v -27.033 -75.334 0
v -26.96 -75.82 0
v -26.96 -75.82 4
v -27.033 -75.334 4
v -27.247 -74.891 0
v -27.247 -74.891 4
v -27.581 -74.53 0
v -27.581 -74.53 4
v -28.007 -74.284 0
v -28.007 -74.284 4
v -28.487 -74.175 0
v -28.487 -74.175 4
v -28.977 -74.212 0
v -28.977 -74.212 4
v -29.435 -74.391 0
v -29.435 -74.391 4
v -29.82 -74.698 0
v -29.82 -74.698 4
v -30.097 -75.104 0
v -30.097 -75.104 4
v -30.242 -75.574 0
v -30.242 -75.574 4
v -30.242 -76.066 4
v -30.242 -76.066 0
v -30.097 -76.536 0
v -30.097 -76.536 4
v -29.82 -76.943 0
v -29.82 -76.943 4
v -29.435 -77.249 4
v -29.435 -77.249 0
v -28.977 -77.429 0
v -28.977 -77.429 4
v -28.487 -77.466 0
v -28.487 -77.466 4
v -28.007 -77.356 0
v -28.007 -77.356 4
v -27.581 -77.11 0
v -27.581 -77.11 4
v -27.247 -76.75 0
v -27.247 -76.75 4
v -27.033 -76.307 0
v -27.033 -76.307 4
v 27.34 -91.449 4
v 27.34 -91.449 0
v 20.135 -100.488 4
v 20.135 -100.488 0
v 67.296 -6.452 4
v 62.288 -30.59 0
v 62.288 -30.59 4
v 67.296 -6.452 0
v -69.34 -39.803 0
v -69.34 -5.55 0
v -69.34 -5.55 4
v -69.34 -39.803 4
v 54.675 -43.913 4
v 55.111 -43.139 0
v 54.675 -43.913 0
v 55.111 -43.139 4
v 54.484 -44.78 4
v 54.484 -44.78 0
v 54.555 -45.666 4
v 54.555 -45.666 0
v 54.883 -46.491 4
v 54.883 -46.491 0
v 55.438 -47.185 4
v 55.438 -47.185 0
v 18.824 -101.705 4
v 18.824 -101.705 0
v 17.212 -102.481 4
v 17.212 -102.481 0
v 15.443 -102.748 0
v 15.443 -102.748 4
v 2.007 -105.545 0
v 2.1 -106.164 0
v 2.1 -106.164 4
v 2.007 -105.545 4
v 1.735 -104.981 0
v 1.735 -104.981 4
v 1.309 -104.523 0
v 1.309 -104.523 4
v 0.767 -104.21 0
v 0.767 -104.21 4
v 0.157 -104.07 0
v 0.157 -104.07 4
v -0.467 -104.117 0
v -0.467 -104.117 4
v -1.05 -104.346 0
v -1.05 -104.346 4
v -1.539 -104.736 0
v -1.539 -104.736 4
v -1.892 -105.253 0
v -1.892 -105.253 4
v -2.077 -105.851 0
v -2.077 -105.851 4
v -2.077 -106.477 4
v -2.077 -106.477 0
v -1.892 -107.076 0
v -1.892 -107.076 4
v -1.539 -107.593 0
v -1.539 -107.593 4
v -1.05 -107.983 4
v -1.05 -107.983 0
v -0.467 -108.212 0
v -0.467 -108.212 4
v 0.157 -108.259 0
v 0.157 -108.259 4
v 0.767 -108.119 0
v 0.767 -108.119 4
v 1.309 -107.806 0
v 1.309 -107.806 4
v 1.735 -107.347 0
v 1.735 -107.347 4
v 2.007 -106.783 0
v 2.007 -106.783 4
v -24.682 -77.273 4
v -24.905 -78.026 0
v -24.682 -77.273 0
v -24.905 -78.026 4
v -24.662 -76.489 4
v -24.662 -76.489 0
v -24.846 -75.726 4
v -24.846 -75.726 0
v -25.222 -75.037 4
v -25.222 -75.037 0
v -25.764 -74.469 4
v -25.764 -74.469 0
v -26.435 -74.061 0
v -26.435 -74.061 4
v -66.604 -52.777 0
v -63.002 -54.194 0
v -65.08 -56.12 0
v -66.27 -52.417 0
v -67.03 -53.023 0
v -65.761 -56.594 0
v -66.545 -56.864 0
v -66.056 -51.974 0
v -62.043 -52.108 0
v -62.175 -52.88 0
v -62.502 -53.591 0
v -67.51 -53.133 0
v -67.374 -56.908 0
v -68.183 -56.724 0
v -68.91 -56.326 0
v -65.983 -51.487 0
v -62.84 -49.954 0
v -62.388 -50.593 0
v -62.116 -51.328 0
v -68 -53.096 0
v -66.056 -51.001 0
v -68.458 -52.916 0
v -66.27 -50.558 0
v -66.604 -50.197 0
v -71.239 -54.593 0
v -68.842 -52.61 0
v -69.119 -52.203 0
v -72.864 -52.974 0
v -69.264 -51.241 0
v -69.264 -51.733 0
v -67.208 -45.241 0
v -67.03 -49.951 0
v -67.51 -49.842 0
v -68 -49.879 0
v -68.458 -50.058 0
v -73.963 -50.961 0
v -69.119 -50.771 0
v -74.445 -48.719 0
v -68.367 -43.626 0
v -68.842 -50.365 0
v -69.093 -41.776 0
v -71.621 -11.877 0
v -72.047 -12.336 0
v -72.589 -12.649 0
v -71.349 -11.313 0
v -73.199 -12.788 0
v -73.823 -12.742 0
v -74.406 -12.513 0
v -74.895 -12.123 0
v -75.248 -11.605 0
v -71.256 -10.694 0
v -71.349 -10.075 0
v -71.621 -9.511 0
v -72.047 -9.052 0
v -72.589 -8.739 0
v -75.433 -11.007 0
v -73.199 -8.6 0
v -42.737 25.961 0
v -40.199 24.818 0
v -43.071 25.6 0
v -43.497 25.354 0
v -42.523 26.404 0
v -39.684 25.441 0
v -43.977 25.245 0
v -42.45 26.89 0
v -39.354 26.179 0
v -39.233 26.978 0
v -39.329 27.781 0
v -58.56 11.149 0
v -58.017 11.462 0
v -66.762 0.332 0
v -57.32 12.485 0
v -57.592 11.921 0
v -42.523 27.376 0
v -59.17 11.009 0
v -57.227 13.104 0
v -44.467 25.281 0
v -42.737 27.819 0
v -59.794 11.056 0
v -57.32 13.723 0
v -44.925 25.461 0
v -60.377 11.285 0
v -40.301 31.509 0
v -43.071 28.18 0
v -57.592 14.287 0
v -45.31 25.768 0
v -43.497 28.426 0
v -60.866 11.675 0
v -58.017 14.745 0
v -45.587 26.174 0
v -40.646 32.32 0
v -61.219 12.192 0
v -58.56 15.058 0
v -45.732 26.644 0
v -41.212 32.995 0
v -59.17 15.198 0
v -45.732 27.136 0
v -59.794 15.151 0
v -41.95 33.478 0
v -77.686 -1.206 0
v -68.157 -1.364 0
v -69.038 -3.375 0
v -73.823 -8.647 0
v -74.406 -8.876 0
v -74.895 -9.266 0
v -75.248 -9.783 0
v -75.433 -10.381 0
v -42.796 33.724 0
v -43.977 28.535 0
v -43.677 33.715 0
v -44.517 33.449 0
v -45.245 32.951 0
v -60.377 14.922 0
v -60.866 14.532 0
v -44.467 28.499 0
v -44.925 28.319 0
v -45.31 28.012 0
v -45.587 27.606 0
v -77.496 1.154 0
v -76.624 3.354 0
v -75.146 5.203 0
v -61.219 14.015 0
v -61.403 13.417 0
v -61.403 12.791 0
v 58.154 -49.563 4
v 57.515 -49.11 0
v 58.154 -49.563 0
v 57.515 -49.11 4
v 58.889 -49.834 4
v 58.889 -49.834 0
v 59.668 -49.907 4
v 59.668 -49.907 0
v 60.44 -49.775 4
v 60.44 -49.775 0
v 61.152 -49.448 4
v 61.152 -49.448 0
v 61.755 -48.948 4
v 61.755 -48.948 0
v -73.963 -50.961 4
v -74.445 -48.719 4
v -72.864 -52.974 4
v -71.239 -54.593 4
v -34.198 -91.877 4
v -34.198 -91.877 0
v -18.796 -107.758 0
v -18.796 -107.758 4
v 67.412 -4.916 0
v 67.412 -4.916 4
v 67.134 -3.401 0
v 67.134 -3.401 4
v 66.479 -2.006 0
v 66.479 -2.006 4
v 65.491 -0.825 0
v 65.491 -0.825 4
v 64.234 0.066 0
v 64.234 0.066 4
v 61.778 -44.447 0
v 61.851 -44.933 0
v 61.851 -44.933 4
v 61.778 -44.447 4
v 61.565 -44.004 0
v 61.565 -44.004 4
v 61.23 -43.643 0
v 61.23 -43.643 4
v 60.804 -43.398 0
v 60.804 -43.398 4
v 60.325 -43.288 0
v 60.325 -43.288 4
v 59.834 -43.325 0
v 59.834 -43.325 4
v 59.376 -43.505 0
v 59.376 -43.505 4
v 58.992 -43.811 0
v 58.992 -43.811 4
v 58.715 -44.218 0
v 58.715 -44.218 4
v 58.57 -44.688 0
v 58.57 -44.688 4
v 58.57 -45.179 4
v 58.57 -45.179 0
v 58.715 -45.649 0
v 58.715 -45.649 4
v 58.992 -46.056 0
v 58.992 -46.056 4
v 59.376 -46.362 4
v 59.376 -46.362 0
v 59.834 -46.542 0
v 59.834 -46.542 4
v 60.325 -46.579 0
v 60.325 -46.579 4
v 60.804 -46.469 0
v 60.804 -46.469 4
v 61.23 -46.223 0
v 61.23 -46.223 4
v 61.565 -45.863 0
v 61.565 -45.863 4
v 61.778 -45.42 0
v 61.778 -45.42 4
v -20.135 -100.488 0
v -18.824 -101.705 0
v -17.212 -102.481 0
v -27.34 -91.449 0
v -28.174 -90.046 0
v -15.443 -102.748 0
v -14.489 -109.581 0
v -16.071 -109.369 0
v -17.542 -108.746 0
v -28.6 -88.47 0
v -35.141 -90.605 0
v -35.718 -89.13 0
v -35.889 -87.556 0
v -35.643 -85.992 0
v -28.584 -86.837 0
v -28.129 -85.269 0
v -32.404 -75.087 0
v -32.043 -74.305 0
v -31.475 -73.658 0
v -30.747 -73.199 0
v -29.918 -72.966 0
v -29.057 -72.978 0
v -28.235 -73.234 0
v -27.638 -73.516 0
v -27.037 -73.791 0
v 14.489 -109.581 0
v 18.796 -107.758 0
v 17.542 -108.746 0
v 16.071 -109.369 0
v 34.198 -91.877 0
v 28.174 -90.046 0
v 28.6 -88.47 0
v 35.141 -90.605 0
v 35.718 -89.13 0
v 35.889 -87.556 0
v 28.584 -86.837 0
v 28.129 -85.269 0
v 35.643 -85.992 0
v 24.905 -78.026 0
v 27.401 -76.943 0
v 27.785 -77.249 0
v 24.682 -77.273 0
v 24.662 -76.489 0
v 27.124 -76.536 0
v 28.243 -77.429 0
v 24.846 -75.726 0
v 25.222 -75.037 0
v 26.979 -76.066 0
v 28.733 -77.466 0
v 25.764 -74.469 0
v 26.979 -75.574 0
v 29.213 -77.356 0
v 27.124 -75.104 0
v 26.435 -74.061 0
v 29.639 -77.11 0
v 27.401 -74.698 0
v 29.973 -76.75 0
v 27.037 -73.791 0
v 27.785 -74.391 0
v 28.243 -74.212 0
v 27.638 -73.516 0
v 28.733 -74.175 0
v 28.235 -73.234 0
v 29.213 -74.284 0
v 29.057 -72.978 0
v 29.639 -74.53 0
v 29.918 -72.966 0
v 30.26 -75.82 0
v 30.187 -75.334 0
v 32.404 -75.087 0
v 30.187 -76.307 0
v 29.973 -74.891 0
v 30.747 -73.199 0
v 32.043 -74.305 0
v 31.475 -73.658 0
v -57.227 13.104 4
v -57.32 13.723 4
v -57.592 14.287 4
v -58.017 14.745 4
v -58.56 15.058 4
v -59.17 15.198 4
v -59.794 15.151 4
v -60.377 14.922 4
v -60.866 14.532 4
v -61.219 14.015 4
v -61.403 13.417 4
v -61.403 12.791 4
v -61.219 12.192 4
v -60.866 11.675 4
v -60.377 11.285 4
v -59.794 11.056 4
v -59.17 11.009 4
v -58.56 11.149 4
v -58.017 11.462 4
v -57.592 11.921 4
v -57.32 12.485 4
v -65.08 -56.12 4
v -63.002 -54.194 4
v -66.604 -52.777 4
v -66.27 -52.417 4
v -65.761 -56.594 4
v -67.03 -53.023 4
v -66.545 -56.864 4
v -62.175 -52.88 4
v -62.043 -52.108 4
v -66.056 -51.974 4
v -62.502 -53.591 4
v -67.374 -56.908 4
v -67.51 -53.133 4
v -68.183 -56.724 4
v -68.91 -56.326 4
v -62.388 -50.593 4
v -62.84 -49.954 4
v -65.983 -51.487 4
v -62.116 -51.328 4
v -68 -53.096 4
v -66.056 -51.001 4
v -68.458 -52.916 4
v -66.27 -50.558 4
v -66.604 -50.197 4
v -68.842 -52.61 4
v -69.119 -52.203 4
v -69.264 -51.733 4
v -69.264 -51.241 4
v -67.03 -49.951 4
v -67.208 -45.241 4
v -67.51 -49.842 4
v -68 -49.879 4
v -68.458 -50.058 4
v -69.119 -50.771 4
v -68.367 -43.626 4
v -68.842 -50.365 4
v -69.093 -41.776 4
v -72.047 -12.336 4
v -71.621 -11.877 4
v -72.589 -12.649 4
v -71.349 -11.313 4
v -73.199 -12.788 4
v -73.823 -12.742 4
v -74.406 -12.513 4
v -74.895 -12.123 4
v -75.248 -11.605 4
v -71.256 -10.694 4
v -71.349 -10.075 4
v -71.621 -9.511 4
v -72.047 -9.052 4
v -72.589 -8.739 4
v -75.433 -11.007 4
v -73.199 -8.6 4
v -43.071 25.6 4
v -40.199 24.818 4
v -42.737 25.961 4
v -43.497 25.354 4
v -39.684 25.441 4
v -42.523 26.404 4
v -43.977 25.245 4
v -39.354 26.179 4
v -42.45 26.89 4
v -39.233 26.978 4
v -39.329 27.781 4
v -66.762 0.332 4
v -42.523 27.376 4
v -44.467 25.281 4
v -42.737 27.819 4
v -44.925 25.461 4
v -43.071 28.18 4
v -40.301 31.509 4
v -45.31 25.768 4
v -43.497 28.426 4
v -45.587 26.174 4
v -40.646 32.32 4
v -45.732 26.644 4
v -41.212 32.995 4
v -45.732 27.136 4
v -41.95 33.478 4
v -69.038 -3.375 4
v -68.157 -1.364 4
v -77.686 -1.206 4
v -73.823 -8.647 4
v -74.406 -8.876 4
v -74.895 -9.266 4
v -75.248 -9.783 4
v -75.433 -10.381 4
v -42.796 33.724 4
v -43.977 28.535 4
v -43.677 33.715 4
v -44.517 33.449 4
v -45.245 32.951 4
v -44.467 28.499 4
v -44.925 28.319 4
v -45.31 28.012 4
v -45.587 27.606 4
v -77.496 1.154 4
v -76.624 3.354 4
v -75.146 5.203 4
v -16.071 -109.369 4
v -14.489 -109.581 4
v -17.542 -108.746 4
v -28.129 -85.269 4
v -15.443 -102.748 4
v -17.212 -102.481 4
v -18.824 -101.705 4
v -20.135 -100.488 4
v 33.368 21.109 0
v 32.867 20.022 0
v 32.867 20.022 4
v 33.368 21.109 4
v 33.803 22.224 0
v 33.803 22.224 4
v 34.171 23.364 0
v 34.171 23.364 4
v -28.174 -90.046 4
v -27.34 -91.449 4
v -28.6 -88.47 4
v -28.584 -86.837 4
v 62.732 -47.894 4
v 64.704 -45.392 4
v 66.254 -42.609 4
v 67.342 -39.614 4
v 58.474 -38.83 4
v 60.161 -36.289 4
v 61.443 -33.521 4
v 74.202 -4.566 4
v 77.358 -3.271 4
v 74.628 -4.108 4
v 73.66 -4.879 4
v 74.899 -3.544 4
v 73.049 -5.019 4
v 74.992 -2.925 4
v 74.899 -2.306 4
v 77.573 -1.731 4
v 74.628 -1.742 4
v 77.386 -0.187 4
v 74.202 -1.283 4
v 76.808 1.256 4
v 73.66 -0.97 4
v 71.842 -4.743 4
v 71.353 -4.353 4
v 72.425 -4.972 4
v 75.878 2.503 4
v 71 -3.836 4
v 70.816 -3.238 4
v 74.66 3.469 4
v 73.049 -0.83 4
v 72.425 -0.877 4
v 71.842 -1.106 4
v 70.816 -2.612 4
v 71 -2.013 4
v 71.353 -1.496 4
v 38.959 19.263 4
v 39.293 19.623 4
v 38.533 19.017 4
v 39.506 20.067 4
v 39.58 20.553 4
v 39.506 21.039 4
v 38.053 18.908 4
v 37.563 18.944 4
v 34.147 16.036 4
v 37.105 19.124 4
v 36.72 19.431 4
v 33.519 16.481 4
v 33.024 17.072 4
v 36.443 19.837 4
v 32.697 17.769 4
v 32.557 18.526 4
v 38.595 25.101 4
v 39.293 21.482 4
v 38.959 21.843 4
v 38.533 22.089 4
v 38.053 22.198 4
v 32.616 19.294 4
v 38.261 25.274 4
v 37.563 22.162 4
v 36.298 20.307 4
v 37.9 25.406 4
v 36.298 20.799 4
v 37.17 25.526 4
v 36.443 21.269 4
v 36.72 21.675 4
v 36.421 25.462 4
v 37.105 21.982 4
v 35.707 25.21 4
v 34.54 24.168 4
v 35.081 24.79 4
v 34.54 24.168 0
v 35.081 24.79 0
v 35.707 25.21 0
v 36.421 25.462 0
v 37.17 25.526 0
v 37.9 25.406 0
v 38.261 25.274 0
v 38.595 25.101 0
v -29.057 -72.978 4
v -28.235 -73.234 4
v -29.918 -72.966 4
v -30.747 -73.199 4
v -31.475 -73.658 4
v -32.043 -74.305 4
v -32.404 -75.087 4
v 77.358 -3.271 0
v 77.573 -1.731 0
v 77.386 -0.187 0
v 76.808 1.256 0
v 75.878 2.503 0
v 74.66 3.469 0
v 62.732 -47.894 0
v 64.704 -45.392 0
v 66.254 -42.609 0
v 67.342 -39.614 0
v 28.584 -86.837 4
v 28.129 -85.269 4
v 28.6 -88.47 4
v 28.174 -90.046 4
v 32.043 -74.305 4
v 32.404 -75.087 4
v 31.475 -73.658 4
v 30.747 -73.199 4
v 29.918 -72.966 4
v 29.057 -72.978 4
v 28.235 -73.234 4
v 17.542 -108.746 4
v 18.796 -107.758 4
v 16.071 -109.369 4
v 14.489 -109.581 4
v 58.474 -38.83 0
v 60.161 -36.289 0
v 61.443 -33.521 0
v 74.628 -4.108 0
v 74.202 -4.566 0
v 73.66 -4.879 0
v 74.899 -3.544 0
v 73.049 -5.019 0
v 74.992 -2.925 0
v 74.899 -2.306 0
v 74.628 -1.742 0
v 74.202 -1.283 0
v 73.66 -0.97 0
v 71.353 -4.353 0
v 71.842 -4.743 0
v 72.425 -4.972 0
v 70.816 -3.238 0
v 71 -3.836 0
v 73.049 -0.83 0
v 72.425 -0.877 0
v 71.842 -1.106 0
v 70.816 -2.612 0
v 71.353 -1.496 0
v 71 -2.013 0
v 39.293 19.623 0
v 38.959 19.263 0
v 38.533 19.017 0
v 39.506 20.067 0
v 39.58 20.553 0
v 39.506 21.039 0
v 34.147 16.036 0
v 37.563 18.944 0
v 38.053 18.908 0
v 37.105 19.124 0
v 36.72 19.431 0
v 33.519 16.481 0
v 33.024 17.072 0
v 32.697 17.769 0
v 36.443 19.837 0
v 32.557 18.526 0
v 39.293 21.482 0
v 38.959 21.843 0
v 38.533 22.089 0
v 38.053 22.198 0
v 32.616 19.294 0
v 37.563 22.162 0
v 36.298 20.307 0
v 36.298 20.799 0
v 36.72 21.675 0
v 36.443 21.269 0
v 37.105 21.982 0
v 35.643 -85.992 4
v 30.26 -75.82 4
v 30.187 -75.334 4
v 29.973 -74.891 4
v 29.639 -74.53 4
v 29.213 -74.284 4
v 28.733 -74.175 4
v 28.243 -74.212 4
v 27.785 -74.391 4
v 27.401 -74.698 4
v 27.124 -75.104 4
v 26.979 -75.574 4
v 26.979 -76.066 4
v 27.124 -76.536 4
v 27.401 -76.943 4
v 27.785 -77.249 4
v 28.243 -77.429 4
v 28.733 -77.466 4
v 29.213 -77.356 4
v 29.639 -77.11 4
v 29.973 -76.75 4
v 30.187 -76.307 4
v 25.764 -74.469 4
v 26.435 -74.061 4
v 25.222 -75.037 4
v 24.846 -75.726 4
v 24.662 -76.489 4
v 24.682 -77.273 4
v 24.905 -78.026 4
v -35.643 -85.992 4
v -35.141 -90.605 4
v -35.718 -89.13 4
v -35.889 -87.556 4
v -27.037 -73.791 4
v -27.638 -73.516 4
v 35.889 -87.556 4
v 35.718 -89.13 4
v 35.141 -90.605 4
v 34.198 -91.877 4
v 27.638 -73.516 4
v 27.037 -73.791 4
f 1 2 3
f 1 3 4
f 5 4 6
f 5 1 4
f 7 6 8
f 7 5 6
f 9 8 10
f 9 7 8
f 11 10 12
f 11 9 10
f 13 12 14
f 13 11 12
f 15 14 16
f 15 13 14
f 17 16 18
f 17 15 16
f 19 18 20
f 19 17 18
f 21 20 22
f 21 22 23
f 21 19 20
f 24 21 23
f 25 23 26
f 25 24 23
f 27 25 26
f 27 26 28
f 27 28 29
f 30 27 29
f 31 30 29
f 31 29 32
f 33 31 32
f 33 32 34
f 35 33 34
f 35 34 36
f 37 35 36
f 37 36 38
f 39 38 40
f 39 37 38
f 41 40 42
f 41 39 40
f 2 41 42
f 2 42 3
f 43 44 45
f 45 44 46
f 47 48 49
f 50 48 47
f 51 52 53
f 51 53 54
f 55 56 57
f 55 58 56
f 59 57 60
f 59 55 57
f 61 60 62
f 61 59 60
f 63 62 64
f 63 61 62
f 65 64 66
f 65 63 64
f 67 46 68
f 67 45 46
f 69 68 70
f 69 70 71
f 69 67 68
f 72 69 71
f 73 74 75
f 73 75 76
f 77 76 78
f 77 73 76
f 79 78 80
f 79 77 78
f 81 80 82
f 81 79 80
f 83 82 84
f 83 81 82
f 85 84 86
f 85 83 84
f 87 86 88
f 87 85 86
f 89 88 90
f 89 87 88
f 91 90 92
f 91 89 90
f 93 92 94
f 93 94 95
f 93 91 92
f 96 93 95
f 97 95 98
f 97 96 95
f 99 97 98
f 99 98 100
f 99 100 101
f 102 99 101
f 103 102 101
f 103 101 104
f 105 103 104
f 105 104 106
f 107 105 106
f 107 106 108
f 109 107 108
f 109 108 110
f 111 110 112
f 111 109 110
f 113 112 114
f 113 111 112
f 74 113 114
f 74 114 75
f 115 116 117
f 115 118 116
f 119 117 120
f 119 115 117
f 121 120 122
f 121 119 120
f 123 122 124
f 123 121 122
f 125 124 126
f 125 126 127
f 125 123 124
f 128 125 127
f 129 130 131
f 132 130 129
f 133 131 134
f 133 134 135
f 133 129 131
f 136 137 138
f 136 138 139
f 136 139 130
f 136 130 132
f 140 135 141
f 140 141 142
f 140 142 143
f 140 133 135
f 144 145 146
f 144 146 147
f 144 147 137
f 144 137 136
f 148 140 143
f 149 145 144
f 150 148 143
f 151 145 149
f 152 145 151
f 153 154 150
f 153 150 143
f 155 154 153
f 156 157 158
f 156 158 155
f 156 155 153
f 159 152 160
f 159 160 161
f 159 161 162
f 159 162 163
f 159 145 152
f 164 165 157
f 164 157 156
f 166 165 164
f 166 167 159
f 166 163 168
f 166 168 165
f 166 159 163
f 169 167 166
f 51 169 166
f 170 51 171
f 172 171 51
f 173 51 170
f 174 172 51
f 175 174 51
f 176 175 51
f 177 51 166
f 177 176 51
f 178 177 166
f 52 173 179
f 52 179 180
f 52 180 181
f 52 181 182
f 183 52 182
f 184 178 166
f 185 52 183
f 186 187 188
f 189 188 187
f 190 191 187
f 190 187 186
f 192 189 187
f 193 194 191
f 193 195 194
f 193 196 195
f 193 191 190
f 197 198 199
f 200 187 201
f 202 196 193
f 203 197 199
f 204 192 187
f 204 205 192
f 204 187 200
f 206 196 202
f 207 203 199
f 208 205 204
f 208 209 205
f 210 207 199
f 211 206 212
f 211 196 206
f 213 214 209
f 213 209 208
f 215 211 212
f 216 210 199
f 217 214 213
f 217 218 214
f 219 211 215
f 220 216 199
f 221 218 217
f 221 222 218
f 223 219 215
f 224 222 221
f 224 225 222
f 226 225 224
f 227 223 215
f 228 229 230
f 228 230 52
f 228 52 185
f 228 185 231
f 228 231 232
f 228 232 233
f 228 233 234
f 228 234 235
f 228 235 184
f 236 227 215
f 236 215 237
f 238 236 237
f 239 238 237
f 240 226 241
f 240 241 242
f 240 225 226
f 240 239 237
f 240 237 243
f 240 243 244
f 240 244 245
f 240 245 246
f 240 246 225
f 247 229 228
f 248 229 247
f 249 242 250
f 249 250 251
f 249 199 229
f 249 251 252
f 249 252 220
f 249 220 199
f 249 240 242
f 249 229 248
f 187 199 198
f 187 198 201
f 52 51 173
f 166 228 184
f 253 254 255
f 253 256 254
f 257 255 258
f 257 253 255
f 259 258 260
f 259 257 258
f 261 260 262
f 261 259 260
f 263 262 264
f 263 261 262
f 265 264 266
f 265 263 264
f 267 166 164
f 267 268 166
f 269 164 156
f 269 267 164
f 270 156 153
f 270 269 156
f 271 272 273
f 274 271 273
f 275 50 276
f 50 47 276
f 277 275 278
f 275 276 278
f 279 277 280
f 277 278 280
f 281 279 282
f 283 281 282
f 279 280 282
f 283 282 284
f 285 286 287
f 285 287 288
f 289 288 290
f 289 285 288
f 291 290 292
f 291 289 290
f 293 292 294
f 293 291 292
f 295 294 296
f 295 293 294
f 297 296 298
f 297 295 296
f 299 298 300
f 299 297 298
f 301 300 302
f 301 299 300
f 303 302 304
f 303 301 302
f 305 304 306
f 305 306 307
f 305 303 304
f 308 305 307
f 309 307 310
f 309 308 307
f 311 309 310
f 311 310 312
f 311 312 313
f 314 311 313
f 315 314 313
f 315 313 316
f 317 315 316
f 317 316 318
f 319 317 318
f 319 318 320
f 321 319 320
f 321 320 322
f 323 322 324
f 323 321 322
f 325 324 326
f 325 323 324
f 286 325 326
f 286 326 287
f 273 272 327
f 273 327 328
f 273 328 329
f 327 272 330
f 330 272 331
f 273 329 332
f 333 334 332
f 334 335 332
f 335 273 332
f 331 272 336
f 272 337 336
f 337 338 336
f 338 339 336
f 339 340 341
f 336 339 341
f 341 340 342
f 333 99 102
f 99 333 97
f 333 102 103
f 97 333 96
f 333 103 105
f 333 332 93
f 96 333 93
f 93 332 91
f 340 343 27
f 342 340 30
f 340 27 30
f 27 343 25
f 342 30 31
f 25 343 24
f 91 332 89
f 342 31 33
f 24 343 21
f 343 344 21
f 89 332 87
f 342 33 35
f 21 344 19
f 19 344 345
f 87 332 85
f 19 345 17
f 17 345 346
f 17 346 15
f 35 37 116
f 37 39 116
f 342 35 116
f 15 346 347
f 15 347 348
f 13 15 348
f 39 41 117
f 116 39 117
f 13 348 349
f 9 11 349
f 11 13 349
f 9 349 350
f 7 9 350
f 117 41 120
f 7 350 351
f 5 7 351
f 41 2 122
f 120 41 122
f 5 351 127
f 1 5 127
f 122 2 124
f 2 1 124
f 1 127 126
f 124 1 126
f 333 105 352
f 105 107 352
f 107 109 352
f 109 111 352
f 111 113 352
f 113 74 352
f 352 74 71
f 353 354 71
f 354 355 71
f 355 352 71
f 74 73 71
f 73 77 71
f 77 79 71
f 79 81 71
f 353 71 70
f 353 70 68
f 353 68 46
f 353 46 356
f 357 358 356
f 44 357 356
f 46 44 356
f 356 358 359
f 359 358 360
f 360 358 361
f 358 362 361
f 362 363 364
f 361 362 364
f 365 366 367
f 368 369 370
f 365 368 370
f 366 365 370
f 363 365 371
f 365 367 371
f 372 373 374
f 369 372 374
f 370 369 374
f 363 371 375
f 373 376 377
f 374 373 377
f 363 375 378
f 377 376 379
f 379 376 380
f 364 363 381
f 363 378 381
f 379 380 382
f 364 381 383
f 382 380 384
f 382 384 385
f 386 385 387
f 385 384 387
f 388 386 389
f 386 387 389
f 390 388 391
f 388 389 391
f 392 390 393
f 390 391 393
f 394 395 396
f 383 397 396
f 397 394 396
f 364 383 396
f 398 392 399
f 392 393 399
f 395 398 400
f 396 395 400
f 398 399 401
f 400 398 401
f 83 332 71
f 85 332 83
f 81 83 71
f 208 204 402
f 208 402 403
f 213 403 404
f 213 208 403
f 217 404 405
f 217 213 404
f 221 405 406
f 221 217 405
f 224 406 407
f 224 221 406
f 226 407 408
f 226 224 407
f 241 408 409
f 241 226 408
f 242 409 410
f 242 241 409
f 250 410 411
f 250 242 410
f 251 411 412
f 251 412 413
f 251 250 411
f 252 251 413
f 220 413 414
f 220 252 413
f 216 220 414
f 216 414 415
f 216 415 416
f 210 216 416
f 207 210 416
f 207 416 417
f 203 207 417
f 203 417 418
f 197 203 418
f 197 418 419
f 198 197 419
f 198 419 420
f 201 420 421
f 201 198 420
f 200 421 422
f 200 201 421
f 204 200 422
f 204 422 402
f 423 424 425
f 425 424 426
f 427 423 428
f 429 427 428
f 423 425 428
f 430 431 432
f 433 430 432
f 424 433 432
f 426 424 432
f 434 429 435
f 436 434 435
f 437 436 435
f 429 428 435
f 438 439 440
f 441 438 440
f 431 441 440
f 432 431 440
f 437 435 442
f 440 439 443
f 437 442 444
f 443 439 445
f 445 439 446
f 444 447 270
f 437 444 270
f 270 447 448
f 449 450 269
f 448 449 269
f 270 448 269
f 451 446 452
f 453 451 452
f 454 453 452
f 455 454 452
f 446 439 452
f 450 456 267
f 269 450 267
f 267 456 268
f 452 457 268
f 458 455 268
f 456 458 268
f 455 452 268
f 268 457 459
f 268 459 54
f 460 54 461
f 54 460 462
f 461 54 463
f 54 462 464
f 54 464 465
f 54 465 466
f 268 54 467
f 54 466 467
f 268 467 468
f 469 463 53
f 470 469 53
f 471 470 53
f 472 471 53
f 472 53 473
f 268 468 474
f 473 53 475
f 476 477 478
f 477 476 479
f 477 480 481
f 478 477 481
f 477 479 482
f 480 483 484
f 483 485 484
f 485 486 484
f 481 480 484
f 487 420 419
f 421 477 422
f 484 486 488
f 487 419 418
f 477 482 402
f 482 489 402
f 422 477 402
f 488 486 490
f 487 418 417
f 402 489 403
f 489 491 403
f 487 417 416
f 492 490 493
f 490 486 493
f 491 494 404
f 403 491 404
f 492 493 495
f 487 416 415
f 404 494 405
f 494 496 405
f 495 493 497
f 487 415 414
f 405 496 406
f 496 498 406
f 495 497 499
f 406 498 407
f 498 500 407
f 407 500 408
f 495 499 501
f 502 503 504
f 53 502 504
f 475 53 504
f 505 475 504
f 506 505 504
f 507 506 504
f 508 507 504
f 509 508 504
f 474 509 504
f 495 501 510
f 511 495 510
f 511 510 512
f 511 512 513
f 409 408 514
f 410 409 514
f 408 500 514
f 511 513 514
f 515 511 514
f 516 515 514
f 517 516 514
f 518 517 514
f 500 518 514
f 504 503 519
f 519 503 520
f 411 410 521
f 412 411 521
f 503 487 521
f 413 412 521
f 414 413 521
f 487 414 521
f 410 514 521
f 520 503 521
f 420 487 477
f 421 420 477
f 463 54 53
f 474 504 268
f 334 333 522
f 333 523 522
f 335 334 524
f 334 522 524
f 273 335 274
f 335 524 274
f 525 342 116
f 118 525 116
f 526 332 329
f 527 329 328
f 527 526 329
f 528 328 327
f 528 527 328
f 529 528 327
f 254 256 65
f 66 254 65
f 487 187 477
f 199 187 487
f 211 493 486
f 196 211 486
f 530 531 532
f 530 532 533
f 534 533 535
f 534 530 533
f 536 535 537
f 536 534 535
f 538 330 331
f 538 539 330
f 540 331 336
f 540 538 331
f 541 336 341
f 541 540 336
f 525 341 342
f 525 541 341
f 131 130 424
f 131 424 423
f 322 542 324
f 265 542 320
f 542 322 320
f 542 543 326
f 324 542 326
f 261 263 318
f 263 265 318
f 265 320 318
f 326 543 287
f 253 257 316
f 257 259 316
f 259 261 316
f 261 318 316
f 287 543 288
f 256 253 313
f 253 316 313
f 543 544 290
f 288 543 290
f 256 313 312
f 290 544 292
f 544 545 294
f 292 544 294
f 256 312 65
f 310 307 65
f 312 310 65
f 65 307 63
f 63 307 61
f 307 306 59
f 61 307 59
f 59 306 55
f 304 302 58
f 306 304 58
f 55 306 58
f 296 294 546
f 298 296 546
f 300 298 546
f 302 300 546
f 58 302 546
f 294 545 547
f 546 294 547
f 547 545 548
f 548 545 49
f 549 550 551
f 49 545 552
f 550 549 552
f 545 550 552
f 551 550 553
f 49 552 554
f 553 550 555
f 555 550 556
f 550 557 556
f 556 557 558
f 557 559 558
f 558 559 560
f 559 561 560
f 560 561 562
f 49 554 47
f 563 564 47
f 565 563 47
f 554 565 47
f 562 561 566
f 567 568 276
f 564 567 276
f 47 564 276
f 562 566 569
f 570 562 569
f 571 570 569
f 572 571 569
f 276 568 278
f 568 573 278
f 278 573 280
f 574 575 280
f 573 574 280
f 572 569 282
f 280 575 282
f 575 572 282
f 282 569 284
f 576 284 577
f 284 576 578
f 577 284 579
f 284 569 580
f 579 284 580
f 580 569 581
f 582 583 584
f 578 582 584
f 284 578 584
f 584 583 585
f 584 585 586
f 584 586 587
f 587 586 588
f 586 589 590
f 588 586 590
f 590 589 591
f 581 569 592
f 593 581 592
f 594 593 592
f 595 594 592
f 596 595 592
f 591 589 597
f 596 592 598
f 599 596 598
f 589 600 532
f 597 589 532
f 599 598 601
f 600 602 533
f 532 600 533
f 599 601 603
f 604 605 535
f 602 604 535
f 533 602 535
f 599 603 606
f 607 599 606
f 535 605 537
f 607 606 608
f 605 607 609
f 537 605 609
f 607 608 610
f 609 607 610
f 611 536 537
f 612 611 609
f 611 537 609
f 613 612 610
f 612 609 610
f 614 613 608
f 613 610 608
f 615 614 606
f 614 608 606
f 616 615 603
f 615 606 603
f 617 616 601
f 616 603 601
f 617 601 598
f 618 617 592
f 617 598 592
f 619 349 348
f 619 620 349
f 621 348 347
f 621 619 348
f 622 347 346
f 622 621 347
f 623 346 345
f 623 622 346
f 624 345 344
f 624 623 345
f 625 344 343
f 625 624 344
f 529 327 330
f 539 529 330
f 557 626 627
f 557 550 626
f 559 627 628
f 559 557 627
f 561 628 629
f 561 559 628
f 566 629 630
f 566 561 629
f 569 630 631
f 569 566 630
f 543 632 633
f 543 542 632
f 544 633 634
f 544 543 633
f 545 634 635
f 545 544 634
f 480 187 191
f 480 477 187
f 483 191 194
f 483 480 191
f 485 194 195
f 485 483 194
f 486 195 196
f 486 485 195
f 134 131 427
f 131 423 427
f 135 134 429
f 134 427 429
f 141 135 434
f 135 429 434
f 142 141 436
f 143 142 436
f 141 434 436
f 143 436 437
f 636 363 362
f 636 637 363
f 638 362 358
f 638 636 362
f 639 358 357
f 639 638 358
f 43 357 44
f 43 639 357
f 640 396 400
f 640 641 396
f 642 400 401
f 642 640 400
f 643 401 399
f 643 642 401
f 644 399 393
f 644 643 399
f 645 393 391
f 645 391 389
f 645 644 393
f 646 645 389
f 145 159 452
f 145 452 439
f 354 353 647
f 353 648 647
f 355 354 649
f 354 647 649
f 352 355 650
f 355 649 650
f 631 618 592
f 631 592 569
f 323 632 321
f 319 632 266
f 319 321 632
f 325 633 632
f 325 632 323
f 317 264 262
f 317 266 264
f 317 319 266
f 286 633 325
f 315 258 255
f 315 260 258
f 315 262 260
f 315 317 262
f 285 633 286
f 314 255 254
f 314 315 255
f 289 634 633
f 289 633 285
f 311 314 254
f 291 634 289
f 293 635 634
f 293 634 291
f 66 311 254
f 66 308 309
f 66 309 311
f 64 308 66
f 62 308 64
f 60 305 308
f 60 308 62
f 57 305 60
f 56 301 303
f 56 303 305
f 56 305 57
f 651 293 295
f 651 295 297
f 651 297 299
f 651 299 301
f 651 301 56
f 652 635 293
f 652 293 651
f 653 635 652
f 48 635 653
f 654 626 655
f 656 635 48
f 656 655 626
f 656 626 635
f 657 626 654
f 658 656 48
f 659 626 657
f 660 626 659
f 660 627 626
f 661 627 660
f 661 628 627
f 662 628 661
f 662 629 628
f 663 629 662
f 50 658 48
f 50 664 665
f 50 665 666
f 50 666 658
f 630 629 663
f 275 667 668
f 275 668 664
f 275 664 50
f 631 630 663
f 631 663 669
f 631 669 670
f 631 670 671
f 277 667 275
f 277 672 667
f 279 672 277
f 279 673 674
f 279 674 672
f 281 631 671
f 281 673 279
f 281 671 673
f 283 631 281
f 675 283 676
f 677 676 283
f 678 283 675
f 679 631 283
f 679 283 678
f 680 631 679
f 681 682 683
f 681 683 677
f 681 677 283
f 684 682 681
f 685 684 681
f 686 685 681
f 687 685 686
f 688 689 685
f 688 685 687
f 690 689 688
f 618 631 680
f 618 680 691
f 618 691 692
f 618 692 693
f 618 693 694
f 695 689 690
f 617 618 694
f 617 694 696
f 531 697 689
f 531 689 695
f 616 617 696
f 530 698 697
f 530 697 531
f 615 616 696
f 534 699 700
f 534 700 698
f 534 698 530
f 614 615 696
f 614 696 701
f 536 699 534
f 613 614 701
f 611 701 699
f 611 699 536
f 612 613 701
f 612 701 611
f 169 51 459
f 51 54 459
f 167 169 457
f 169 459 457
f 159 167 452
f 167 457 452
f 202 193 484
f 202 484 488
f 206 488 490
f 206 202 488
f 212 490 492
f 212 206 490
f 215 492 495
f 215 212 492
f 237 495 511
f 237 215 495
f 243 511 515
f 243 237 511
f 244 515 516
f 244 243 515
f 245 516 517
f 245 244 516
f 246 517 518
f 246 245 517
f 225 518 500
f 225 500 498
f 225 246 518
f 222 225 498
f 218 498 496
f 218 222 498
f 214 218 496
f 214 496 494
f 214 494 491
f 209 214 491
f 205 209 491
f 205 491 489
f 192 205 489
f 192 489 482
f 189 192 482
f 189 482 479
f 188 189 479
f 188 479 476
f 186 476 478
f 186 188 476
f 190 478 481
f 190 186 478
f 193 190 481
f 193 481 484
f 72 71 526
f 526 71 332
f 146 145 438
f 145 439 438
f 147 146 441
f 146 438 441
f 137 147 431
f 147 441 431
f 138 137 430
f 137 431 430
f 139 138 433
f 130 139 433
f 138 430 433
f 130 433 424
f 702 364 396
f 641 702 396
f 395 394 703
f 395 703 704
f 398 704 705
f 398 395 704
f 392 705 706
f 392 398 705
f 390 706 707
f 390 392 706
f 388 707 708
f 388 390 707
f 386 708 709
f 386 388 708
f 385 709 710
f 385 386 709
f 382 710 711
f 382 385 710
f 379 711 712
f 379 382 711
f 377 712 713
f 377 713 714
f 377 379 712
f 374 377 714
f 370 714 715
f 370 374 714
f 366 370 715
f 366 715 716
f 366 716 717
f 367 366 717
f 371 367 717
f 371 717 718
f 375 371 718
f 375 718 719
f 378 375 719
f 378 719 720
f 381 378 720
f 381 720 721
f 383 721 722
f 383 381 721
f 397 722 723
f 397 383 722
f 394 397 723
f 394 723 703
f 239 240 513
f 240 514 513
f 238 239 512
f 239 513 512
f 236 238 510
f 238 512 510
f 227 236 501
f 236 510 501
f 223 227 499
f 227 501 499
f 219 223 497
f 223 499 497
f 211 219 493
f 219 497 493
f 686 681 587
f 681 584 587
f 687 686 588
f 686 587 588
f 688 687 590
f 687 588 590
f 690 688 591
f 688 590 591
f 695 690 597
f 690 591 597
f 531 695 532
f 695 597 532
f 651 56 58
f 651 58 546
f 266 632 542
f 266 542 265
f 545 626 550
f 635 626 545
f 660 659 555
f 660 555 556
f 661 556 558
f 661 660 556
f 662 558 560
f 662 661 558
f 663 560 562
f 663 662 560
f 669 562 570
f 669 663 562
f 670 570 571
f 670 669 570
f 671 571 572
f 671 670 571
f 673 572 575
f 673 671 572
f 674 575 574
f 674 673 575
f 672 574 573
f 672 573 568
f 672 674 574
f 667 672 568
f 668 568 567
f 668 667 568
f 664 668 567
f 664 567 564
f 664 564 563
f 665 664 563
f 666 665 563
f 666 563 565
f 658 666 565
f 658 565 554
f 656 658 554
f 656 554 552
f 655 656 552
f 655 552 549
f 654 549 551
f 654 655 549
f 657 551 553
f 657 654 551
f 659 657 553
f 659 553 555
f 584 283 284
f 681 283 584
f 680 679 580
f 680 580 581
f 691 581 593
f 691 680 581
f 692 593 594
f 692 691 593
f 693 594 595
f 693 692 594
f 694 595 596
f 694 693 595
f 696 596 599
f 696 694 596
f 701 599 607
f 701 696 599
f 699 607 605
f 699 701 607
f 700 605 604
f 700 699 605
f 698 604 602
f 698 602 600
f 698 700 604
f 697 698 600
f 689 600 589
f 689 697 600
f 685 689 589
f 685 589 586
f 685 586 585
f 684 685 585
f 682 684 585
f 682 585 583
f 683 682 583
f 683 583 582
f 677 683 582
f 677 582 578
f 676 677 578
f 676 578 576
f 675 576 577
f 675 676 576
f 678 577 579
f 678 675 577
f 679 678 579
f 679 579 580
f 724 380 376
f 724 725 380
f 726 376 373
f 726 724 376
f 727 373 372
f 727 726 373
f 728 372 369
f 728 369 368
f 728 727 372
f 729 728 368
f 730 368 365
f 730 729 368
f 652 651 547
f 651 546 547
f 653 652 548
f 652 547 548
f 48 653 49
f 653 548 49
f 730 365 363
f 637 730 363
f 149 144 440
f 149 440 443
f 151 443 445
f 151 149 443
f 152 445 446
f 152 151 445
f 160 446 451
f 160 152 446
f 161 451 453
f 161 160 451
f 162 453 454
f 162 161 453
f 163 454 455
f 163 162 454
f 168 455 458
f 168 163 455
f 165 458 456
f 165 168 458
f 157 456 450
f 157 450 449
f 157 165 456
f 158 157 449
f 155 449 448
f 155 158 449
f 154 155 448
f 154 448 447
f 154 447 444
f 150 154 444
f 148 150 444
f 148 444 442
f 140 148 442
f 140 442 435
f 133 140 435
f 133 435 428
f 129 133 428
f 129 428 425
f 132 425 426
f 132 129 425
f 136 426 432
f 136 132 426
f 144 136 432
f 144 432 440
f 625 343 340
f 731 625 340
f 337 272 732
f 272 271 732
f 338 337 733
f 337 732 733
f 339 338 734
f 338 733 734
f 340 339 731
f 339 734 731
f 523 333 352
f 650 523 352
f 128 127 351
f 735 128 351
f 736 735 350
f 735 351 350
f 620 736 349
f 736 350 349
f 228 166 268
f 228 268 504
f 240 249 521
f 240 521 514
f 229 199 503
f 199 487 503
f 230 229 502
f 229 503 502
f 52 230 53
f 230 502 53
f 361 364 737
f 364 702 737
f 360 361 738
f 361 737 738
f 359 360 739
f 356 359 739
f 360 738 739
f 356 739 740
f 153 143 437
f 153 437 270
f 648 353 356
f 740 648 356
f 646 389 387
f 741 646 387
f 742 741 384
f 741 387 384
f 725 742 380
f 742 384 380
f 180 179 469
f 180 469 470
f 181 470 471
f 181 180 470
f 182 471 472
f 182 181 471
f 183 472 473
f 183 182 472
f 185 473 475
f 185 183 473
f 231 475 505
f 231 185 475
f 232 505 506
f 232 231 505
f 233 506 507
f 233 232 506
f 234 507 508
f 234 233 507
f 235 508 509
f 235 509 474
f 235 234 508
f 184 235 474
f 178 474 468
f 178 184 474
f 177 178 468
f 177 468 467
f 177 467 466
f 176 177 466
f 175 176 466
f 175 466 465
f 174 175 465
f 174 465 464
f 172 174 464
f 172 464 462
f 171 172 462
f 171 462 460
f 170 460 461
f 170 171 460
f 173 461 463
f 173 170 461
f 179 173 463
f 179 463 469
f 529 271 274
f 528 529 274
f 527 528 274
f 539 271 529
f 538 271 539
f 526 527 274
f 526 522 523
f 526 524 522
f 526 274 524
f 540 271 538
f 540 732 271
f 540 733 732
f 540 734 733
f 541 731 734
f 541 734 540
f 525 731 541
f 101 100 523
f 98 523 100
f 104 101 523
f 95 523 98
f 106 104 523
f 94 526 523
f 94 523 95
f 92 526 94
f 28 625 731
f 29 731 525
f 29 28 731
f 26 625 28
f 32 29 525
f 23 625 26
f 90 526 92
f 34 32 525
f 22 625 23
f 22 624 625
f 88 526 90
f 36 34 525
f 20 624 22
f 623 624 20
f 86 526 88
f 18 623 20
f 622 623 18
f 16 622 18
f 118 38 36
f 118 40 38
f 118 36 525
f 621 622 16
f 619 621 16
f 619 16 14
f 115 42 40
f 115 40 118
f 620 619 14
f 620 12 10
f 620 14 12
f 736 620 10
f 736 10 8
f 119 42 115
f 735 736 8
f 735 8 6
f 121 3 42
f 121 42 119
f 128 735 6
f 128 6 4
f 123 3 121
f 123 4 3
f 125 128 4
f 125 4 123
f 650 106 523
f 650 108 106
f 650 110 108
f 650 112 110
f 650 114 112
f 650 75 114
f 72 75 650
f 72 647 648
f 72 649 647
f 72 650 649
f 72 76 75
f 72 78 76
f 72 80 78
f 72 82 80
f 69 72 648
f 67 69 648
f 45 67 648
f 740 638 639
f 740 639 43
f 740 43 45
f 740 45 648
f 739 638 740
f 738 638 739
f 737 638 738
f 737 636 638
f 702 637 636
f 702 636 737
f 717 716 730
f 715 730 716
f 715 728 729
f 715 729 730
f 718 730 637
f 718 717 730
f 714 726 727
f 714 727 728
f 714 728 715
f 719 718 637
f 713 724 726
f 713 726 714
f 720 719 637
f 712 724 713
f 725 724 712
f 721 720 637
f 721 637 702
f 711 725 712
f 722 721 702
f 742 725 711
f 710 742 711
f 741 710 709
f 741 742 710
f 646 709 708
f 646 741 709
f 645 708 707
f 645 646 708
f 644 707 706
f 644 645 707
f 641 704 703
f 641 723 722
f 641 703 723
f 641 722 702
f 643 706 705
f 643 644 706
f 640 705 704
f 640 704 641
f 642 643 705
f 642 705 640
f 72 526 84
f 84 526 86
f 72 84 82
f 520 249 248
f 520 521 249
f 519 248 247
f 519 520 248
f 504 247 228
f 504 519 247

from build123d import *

# Parameters (mm, degrees)
SKETCH_1_R      = 1.65
SKETCH_1_R_2    = 2.1
EXTRUDE_1_DEPTH = 4
FILLET_1_R      = 20
FILLET_2_R      = 3
FILLET_3_R      = 6
FILLET_4_R      = 3
FILLET_5_R      = 3
FILLET_6_R      = 6
FILLET_7_R      = 6
FILLET_8_R      = 3
FILLET_9_R      = 8


with BuildPart() as part:
    # 草图1 → 凸台-拉伸1 (new body)
    # profile 1 of 5: a face of its own
    with BuildSketch(Plane.XY):
        Polygon((-77.945405083, 2.604841831), (-41.566231945, 36.364781808), (-38.875318831, 26.038559191), (-69.339571839, -2.044157442), (-69.339571839, -42.939996997), (-60.801466828, -52.154864748), (-66.909557952, -57.814362512), (-74.194826339, -52.394150256), align=None)
        with Locations((-44.1, 26.89)):
            Circle(SKETCH_1_R, mode=Mode.SUBTRACT)
        with Locations((-67.632870637, -51.487254798)):
            Circle(SKETCH_1_R, mode=Mode.SUBTRACT)
        with Locations((-59.326738736, 13.103569808)):
            Circle(SKETCH_1_R_2, mode=Mode.SUBTRACT)
        with Locations((-73.356046193, -10.69429247)):
            Circle(SKETCH_1_R_2, mode=Mode.SUBTRACT)
    # profile 2 of 5: a face of its own
    with BuildSketch(Plane.XY):
        with BuildLine():
            ThreePointArc((31.376803603, 17.505732499), (33.128070546, 20.566305741), (34.314610381, 23.886873116))
            Line((34.314610381, 23.886873116), (35.166942334, 27.157647426))
            Line((35.166942334, 27.157647426), (78.569062885, 1.124085584))
            Line((78.569062885, 1.124085584), (66.046380792, -44.316295638))
            Line((66.046380792, -44.316295638), (59.715665593, -51.148807449))
            Line((59.715665593, -51.148807449), (53.416137419, -45.311932247))
            Line((53.416137419, -45.311932247), (61.341189712, -35.154345924))
            Line((61.341189712, -35.154345924), (68.210178439, -2.044157442))
            Line((68.210178439, -2.044157442), (31.376803603, 17.505732499))
        make_face()
        with Locations((37.929803622, 20.552893435)):
            Circle(SKETCH_1_R, mode=Mode.SUBTRACT)
        with Locations((60.201437699, -44.933461153)):
            Circle(SKETCH_1_R, mode=Mode.SUBTRACT)
        with Locations((72.892421676, -2.924569169)):
            Circle(SKETCH_1_R_2, mode=Mode.SUBTRACT)
    # profile 3 of 5: a face of its own
    with BuildSketch(Plane.XY):
        with BuildLine():
            Line((36.641886012, -89.35704275), (31.376803603, -71.627696822))
            ThreePointArc((31.376803603, -71.627696822), (27.572746465, -73.545827587), (23.652041706, -75.212606079))
            Line((23.652041706, -75.212606079), (29.612111549, -88.598929818))
            Line((29.612111549, -88.598929818), (18.333166842, -102.74766519))
            Line((18.333166842, -102.74766519), (6.109482288, -102.74766519))
            ThreePointArc((6.109482288, -102.74766519), (6.773713015, -104.398972349), (7, -106.164421864))
            ThreePointArc((7, -106.164421864), (6.773713015, -107.92987138), (6.109482288, -109.581178539))
            Line((6.109482288, -109.581178539), (17.028290172, -109.581178539))
            Line((17.028290172, -109.581178539), (36.641886012, -89.35704275))
        make_face()
        with Locations((28.610131123, -75.820370589)):
            Circle(SKETCH_1_R, mode=Mode.SUBTRACT)
    # profile 4 of 5: a face of its own
    with BuildSketch(Plane.XY):
        with BuildLine():
            Line((-17.028290172, -109.581178539), (-6.109482288, -109.581178539))
            ThreePointArc((-6.109482288, -109.581178539), (-7, -106.164421864), (-6.109482288, -102.74766519))
            Line((-6.109482288, -102.74766519), (-18.333166842, -102.74766519))
            Line((-18.333166842, -102.74766519), (-29.612111549, -88.598929818))
            Line((-29.612111549, -88.598929818), (-23.652041706, -75.212606079))
            ThreePointArc((-23.652041706, -75.212606079), (-27.572746465, -73.545827587), (-31.376803603, -71.627696822))
            Line((-31.376803603, -71.627696822), (-36.641886012, -89.35704275))
            Line((-36.641886012, -89.35704275), (-17.028290172, -109.581178539))
        make_face()
        with Locations((-28.610131123, -75.820370589)):
            Circle(SKETCH_1_R, mode=Mode.SUBTRACT)
    # profile 5 of 5: a face of its own
    with BuildSketch(Plane.XY):
        with BuildLine():
            Line((-6.109482288, -109.581178539), (6.109482288, -109.581178539))
            ThreePointArc((6.109482288, -109.581178539), (6.773713015, -107.92987138), (7, -106.164421864))
            ThreePointArc((7, -106.164421864), (6.773713015, -104.398972349), (6.109482288, -102.74766519))
            Line((6.109482288, -102.74766519), (-6.109482288, -102.74766519))
            ThreePointArc((-6.109482288, -102.74766519), (-7, -106.164421864), (-6.109482288, -109.581178539))
        make_face()
        with Locations((0, -106.164421864)):
            Circle(SKETCH_1_R_2, mode=Mode.SUBTRACT)
    extrude(amount=EXTRUDE_1_DEPTH)

    # 圆角1
    fillet_1_edges = [part.edges().sort_by_distance(p)[0] for p in [
        (66.046380792, -44.316295638, 2),
        (61.341189712, -35.154345924, 2),
    ]]
    fillet(fillet_1_edges, radius=FILLET_1_R)

    # 圆角2
    fillet_2_edges = [part.edges().sort_by_distance(p)[0] for p in [
        (59.715665593, -51.148807449, 2),
        (53.416137419, -45.311932247, 2),
    ]]
    fillet(fillet_2_edges, radius=FILLET_2_R)

    # 圆角3
    fillet_3_edges = [part.edges().sort_by_distance(p)[0] for p in [
        (78.569062885, 1.124085584, 2),
        (68.210178439, -2.044157442, 2),
    ]]
    fillet(fillet_3_edges, radius=FILLET_3_R)

    # 圆角4
    fillet_4_edges = [part.edges().sort_by_distance(p)[0] for p in [
        (35.166942334, 27.157647426, 2),
        (31.376803603, 17.505732499, 2),
    ]]
    fillet(fillet_4_edges, radius=FILLET_4_R)

    # 圆角5
    fillet_5_edges = [part.edges().sort_by_distance(p)[0] for p in [
        (31.376803603, -71.627696822, 2),
        (-31.376803603, -71.627696822, 2),
        (-23.652041706, -75.212606079, 2),
        (23.652041706, -75.212606079, 2),
    ]]
    fillet(fillet_5_edges, radius=FILLET_5_R)

    # 圆角6
    fillet_6_edges = [part.edges().sort_by_distance(p)[0] for p in [
        (36.641886012, -89.35704275, 2),
        (-36.641886012, -89.35704275, 2),
        (-29.612111549, -88.598929818, 2),
        (29.612111549, -88.598929818, 2),
    ]]
    fillet(fillet_6_edges, radius=FILLET_6_R)

    # 圆角7
    fillet_7_edges = [part.edges().sort_by_distance(p)[0] for p in [
        (17.028290172, -109.581178539, 2),
        (-17.028290172, -109.581178539, 2),
        (-18.333166842, -102.74766519, 2),
        (18.333166842, -102.74766519, 2),
    ]]
    fillet(fillet_7_edges, radius=FILLET_7_R)

    # 圆角8
    fillet_8_edges = [part.edges().sort_by_distance(p)[0] for p in [
        (-41.566231945, 36.364781808, 2),
        (-38.875318831, 26.038559191, 2),
        (-60.801466828, -52.154864748, 2),
        (-66.909557952, -57.814362512, 2),
    ]]
    fillet(fillet_8_edges, radius=FILLET_8_R)

    # 圆角9
    fillet_9_edges = [part.edges().sort_by_distance(p)[0] for p in [
        (-69.339571839, -2.044157442, 2),
        (-69.339571839, -42.939996997, 2),
        (-74.194826339, -52.394150256, 2),
        (-77.945405083, 2.604841831, 2),
    ]]
    fillet(fillet_9_edges, radius=FILLET_9_R)


solid = part.part
